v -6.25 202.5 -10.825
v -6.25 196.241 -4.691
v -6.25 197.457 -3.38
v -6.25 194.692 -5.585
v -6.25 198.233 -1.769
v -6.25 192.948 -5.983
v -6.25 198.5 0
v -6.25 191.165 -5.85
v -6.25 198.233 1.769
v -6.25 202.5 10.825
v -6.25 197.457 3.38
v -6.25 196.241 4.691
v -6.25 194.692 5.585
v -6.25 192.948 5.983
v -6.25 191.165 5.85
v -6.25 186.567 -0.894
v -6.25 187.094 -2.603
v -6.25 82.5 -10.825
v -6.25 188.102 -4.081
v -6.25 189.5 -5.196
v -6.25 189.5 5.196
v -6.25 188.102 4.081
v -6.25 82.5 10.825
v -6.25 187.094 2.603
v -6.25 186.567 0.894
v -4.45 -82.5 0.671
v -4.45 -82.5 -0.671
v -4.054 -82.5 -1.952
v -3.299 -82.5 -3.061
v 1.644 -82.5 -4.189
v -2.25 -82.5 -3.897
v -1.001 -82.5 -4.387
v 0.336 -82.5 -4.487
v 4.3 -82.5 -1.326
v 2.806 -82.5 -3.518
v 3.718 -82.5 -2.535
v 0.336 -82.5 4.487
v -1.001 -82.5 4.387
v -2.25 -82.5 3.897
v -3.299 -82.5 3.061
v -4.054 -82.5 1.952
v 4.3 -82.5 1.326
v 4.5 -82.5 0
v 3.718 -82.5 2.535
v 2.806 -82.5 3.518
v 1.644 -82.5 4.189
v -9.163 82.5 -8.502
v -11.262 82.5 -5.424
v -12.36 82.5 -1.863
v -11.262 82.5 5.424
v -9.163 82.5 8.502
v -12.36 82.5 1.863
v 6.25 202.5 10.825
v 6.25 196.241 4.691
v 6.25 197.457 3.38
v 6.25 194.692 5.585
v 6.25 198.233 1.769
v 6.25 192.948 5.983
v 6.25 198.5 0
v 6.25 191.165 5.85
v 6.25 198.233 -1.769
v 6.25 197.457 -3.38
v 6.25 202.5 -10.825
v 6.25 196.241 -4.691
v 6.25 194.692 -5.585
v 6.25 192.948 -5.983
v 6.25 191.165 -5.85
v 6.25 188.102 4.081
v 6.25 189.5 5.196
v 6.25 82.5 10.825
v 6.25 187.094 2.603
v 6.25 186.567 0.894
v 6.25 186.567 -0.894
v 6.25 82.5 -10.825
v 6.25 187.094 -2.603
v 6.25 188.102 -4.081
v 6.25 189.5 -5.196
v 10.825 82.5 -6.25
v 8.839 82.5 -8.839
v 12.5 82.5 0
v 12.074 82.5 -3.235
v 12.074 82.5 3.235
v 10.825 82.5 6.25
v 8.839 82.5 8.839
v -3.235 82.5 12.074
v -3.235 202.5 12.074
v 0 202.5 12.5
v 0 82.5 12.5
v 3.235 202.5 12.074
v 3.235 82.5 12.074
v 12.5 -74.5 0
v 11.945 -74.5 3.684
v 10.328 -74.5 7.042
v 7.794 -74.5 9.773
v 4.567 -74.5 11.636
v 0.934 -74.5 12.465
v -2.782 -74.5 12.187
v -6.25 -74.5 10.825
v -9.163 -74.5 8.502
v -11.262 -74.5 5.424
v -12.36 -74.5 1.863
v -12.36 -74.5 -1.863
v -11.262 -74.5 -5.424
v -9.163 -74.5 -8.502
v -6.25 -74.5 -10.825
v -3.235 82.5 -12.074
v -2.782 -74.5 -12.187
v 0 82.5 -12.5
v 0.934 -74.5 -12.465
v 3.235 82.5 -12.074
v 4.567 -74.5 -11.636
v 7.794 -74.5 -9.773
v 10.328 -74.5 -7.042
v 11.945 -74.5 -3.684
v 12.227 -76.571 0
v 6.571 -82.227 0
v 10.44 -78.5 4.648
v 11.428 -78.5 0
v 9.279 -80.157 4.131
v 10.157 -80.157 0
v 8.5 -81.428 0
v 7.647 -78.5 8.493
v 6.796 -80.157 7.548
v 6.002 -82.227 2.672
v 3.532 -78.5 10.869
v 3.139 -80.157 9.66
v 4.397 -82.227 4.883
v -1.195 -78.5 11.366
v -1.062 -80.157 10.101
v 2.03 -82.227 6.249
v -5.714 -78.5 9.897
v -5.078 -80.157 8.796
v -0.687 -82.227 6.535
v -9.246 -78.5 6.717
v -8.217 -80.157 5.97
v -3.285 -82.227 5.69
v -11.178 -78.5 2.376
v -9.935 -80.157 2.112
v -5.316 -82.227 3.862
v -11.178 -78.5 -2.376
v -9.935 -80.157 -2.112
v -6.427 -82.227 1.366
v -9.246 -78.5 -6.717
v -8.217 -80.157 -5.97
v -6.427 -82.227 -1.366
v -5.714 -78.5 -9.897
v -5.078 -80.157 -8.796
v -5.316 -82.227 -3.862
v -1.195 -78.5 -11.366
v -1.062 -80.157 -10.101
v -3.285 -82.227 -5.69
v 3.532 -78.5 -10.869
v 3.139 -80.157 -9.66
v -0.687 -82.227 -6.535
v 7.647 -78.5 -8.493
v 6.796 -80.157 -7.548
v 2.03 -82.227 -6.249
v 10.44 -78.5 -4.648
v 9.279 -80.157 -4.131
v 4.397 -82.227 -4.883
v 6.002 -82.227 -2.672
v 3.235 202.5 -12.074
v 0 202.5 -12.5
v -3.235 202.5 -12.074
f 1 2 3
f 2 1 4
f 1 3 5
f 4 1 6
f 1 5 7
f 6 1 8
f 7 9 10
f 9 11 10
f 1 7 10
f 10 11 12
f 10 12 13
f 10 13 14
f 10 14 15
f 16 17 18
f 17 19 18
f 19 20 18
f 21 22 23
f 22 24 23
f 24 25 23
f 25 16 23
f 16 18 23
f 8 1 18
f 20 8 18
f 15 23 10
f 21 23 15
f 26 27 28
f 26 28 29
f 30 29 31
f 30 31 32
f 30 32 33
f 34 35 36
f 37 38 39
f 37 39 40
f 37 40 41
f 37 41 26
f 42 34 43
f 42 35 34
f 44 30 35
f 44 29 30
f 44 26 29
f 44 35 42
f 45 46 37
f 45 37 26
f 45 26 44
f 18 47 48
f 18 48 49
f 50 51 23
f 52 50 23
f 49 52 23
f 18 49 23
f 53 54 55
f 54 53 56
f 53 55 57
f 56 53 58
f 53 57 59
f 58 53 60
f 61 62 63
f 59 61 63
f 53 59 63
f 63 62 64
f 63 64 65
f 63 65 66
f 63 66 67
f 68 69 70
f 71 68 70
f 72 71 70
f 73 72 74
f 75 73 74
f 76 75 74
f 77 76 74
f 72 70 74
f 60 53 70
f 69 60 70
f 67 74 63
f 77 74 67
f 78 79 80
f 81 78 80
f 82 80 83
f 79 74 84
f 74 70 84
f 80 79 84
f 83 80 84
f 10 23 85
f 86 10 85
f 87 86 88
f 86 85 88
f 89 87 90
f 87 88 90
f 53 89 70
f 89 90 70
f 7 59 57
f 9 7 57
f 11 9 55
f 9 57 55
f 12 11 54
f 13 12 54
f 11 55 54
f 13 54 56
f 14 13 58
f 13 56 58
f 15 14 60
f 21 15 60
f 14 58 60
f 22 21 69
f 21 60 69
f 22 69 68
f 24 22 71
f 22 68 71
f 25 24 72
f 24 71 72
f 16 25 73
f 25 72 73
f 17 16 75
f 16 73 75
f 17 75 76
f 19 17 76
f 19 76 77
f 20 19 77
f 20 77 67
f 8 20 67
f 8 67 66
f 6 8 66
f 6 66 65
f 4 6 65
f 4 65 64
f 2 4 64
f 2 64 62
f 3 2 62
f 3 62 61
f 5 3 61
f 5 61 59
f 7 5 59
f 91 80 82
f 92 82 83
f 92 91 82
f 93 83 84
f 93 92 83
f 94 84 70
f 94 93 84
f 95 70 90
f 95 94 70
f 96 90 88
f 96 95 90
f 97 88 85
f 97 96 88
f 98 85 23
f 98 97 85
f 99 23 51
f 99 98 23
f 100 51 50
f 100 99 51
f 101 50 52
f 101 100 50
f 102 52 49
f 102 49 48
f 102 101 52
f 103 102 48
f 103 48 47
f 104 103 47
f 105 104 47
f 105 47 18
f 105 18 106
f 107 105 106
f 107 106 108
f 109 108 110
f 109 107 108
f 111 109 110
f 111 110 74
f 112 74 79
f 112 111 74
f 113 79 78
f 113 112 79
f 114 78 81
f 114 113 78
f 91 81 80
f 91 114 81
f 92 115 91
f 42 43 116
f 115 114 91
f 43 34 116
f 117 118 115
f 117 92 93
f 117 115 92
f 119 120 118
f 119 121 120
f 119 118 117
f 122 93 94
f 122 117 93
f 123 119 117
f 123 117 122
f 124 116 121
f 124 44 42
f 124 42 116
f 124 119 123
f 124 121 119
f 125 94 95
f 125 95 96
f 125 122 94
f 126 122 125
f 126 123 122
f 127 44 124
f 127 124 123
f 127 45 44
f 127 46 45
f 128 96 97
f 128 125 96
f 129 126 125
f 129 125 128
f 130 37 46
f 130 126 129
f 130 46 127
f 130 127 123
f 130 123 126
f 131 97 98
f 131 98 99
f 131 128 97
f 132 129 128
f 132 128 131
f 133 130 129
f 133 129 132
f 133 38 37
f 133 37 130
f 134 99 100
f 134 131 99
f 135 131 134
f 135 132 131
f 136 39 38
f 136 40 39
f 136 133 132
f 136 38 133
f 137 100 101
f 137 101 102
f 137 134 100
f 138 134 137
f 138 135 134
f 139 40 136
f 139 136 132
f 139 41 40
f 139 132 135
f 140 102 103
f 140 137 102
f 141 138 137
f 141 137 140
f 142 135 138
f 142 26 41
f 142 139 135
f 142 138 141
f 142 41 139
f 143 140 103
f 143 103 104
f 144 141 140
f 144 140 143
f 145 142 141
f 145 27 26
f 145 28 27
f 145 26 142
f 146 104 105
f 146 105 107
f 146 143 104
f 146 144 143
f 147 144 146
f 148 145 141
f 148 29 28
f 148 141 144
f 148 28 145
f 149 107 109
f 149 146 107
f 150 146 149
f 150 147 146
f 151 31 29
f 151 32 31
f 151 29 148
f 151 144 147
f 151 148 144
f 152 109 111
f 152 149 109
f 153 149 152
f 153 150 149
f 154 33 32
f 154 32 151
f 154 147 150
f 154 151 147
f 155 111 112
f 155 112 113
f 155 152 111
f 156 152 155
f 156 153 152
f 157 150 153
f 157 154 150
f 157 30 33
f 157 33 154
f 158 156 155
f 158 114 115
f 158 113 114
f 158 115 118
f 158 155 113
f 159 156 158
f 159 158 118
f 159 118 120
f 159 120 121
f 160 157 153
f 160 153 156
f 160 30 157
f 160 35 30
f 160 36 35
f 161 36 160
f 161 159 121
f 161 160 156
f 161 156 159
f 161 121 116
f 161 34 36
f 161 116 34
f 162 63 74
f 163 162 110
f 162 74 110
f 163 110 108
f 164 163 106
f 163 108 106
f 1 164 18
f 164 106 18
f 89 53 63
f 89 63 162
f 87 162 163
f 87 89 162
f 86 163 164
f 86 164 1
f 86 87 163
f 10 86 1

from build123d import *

# Parameters (mm, degrees)
F0_R     = 12.5
F1_DEPTH = 82.5
F3_DEPTH = 120
F4_R     = 8
F5_R     = 6
F6_DEPTH = 25


with BuildPart() as f1:
    # F0 (on Front) → F1 (new body, symmetric)
    with BuildSketch(Plane.XZ):
        Circle(F0_R)
    extrude(amount=F1_DEPTH, both=True)

    # F2 (on face) → F3 (join)
    with BuildSketch(Plane(origin=(0, 82.5, 0), x_dir=(-1, 0, 0), z_dir=(0, 1, 0))):
        with BuildLine():
            Line((6.25, -10.825318), (6.25, 10.825318))
            ThreePointArc((6.25, 10.825318), (0, 12.5), (-6.25, 10.825318))
            Line((-6.25, 10.825318), (-6.25, -10.825318))
            ThreePointArc((-6.25, -10.825318), (0, -12.5), (6.25, -10.825318))
        make_face()
    extrude(amount=F3_DEPTH)

    # F4
    f4_edges = [f1.edges().sort_by_distance(p)[0] for p in [
        (-12.5, -82.5, 0),
    ]]
    fillet(f4_edges, radius=F4_R)

    # F5 (on face) → F6 (cut)
    with BuildSketch(Plane.YZ.offset(6.25)):
        with Locations((192.5, 0)):
            Circle(F5_R)
    extrude(amount=-F6_DEPTH, mode=Mode.SUBTRACT)


solid = f1.part
